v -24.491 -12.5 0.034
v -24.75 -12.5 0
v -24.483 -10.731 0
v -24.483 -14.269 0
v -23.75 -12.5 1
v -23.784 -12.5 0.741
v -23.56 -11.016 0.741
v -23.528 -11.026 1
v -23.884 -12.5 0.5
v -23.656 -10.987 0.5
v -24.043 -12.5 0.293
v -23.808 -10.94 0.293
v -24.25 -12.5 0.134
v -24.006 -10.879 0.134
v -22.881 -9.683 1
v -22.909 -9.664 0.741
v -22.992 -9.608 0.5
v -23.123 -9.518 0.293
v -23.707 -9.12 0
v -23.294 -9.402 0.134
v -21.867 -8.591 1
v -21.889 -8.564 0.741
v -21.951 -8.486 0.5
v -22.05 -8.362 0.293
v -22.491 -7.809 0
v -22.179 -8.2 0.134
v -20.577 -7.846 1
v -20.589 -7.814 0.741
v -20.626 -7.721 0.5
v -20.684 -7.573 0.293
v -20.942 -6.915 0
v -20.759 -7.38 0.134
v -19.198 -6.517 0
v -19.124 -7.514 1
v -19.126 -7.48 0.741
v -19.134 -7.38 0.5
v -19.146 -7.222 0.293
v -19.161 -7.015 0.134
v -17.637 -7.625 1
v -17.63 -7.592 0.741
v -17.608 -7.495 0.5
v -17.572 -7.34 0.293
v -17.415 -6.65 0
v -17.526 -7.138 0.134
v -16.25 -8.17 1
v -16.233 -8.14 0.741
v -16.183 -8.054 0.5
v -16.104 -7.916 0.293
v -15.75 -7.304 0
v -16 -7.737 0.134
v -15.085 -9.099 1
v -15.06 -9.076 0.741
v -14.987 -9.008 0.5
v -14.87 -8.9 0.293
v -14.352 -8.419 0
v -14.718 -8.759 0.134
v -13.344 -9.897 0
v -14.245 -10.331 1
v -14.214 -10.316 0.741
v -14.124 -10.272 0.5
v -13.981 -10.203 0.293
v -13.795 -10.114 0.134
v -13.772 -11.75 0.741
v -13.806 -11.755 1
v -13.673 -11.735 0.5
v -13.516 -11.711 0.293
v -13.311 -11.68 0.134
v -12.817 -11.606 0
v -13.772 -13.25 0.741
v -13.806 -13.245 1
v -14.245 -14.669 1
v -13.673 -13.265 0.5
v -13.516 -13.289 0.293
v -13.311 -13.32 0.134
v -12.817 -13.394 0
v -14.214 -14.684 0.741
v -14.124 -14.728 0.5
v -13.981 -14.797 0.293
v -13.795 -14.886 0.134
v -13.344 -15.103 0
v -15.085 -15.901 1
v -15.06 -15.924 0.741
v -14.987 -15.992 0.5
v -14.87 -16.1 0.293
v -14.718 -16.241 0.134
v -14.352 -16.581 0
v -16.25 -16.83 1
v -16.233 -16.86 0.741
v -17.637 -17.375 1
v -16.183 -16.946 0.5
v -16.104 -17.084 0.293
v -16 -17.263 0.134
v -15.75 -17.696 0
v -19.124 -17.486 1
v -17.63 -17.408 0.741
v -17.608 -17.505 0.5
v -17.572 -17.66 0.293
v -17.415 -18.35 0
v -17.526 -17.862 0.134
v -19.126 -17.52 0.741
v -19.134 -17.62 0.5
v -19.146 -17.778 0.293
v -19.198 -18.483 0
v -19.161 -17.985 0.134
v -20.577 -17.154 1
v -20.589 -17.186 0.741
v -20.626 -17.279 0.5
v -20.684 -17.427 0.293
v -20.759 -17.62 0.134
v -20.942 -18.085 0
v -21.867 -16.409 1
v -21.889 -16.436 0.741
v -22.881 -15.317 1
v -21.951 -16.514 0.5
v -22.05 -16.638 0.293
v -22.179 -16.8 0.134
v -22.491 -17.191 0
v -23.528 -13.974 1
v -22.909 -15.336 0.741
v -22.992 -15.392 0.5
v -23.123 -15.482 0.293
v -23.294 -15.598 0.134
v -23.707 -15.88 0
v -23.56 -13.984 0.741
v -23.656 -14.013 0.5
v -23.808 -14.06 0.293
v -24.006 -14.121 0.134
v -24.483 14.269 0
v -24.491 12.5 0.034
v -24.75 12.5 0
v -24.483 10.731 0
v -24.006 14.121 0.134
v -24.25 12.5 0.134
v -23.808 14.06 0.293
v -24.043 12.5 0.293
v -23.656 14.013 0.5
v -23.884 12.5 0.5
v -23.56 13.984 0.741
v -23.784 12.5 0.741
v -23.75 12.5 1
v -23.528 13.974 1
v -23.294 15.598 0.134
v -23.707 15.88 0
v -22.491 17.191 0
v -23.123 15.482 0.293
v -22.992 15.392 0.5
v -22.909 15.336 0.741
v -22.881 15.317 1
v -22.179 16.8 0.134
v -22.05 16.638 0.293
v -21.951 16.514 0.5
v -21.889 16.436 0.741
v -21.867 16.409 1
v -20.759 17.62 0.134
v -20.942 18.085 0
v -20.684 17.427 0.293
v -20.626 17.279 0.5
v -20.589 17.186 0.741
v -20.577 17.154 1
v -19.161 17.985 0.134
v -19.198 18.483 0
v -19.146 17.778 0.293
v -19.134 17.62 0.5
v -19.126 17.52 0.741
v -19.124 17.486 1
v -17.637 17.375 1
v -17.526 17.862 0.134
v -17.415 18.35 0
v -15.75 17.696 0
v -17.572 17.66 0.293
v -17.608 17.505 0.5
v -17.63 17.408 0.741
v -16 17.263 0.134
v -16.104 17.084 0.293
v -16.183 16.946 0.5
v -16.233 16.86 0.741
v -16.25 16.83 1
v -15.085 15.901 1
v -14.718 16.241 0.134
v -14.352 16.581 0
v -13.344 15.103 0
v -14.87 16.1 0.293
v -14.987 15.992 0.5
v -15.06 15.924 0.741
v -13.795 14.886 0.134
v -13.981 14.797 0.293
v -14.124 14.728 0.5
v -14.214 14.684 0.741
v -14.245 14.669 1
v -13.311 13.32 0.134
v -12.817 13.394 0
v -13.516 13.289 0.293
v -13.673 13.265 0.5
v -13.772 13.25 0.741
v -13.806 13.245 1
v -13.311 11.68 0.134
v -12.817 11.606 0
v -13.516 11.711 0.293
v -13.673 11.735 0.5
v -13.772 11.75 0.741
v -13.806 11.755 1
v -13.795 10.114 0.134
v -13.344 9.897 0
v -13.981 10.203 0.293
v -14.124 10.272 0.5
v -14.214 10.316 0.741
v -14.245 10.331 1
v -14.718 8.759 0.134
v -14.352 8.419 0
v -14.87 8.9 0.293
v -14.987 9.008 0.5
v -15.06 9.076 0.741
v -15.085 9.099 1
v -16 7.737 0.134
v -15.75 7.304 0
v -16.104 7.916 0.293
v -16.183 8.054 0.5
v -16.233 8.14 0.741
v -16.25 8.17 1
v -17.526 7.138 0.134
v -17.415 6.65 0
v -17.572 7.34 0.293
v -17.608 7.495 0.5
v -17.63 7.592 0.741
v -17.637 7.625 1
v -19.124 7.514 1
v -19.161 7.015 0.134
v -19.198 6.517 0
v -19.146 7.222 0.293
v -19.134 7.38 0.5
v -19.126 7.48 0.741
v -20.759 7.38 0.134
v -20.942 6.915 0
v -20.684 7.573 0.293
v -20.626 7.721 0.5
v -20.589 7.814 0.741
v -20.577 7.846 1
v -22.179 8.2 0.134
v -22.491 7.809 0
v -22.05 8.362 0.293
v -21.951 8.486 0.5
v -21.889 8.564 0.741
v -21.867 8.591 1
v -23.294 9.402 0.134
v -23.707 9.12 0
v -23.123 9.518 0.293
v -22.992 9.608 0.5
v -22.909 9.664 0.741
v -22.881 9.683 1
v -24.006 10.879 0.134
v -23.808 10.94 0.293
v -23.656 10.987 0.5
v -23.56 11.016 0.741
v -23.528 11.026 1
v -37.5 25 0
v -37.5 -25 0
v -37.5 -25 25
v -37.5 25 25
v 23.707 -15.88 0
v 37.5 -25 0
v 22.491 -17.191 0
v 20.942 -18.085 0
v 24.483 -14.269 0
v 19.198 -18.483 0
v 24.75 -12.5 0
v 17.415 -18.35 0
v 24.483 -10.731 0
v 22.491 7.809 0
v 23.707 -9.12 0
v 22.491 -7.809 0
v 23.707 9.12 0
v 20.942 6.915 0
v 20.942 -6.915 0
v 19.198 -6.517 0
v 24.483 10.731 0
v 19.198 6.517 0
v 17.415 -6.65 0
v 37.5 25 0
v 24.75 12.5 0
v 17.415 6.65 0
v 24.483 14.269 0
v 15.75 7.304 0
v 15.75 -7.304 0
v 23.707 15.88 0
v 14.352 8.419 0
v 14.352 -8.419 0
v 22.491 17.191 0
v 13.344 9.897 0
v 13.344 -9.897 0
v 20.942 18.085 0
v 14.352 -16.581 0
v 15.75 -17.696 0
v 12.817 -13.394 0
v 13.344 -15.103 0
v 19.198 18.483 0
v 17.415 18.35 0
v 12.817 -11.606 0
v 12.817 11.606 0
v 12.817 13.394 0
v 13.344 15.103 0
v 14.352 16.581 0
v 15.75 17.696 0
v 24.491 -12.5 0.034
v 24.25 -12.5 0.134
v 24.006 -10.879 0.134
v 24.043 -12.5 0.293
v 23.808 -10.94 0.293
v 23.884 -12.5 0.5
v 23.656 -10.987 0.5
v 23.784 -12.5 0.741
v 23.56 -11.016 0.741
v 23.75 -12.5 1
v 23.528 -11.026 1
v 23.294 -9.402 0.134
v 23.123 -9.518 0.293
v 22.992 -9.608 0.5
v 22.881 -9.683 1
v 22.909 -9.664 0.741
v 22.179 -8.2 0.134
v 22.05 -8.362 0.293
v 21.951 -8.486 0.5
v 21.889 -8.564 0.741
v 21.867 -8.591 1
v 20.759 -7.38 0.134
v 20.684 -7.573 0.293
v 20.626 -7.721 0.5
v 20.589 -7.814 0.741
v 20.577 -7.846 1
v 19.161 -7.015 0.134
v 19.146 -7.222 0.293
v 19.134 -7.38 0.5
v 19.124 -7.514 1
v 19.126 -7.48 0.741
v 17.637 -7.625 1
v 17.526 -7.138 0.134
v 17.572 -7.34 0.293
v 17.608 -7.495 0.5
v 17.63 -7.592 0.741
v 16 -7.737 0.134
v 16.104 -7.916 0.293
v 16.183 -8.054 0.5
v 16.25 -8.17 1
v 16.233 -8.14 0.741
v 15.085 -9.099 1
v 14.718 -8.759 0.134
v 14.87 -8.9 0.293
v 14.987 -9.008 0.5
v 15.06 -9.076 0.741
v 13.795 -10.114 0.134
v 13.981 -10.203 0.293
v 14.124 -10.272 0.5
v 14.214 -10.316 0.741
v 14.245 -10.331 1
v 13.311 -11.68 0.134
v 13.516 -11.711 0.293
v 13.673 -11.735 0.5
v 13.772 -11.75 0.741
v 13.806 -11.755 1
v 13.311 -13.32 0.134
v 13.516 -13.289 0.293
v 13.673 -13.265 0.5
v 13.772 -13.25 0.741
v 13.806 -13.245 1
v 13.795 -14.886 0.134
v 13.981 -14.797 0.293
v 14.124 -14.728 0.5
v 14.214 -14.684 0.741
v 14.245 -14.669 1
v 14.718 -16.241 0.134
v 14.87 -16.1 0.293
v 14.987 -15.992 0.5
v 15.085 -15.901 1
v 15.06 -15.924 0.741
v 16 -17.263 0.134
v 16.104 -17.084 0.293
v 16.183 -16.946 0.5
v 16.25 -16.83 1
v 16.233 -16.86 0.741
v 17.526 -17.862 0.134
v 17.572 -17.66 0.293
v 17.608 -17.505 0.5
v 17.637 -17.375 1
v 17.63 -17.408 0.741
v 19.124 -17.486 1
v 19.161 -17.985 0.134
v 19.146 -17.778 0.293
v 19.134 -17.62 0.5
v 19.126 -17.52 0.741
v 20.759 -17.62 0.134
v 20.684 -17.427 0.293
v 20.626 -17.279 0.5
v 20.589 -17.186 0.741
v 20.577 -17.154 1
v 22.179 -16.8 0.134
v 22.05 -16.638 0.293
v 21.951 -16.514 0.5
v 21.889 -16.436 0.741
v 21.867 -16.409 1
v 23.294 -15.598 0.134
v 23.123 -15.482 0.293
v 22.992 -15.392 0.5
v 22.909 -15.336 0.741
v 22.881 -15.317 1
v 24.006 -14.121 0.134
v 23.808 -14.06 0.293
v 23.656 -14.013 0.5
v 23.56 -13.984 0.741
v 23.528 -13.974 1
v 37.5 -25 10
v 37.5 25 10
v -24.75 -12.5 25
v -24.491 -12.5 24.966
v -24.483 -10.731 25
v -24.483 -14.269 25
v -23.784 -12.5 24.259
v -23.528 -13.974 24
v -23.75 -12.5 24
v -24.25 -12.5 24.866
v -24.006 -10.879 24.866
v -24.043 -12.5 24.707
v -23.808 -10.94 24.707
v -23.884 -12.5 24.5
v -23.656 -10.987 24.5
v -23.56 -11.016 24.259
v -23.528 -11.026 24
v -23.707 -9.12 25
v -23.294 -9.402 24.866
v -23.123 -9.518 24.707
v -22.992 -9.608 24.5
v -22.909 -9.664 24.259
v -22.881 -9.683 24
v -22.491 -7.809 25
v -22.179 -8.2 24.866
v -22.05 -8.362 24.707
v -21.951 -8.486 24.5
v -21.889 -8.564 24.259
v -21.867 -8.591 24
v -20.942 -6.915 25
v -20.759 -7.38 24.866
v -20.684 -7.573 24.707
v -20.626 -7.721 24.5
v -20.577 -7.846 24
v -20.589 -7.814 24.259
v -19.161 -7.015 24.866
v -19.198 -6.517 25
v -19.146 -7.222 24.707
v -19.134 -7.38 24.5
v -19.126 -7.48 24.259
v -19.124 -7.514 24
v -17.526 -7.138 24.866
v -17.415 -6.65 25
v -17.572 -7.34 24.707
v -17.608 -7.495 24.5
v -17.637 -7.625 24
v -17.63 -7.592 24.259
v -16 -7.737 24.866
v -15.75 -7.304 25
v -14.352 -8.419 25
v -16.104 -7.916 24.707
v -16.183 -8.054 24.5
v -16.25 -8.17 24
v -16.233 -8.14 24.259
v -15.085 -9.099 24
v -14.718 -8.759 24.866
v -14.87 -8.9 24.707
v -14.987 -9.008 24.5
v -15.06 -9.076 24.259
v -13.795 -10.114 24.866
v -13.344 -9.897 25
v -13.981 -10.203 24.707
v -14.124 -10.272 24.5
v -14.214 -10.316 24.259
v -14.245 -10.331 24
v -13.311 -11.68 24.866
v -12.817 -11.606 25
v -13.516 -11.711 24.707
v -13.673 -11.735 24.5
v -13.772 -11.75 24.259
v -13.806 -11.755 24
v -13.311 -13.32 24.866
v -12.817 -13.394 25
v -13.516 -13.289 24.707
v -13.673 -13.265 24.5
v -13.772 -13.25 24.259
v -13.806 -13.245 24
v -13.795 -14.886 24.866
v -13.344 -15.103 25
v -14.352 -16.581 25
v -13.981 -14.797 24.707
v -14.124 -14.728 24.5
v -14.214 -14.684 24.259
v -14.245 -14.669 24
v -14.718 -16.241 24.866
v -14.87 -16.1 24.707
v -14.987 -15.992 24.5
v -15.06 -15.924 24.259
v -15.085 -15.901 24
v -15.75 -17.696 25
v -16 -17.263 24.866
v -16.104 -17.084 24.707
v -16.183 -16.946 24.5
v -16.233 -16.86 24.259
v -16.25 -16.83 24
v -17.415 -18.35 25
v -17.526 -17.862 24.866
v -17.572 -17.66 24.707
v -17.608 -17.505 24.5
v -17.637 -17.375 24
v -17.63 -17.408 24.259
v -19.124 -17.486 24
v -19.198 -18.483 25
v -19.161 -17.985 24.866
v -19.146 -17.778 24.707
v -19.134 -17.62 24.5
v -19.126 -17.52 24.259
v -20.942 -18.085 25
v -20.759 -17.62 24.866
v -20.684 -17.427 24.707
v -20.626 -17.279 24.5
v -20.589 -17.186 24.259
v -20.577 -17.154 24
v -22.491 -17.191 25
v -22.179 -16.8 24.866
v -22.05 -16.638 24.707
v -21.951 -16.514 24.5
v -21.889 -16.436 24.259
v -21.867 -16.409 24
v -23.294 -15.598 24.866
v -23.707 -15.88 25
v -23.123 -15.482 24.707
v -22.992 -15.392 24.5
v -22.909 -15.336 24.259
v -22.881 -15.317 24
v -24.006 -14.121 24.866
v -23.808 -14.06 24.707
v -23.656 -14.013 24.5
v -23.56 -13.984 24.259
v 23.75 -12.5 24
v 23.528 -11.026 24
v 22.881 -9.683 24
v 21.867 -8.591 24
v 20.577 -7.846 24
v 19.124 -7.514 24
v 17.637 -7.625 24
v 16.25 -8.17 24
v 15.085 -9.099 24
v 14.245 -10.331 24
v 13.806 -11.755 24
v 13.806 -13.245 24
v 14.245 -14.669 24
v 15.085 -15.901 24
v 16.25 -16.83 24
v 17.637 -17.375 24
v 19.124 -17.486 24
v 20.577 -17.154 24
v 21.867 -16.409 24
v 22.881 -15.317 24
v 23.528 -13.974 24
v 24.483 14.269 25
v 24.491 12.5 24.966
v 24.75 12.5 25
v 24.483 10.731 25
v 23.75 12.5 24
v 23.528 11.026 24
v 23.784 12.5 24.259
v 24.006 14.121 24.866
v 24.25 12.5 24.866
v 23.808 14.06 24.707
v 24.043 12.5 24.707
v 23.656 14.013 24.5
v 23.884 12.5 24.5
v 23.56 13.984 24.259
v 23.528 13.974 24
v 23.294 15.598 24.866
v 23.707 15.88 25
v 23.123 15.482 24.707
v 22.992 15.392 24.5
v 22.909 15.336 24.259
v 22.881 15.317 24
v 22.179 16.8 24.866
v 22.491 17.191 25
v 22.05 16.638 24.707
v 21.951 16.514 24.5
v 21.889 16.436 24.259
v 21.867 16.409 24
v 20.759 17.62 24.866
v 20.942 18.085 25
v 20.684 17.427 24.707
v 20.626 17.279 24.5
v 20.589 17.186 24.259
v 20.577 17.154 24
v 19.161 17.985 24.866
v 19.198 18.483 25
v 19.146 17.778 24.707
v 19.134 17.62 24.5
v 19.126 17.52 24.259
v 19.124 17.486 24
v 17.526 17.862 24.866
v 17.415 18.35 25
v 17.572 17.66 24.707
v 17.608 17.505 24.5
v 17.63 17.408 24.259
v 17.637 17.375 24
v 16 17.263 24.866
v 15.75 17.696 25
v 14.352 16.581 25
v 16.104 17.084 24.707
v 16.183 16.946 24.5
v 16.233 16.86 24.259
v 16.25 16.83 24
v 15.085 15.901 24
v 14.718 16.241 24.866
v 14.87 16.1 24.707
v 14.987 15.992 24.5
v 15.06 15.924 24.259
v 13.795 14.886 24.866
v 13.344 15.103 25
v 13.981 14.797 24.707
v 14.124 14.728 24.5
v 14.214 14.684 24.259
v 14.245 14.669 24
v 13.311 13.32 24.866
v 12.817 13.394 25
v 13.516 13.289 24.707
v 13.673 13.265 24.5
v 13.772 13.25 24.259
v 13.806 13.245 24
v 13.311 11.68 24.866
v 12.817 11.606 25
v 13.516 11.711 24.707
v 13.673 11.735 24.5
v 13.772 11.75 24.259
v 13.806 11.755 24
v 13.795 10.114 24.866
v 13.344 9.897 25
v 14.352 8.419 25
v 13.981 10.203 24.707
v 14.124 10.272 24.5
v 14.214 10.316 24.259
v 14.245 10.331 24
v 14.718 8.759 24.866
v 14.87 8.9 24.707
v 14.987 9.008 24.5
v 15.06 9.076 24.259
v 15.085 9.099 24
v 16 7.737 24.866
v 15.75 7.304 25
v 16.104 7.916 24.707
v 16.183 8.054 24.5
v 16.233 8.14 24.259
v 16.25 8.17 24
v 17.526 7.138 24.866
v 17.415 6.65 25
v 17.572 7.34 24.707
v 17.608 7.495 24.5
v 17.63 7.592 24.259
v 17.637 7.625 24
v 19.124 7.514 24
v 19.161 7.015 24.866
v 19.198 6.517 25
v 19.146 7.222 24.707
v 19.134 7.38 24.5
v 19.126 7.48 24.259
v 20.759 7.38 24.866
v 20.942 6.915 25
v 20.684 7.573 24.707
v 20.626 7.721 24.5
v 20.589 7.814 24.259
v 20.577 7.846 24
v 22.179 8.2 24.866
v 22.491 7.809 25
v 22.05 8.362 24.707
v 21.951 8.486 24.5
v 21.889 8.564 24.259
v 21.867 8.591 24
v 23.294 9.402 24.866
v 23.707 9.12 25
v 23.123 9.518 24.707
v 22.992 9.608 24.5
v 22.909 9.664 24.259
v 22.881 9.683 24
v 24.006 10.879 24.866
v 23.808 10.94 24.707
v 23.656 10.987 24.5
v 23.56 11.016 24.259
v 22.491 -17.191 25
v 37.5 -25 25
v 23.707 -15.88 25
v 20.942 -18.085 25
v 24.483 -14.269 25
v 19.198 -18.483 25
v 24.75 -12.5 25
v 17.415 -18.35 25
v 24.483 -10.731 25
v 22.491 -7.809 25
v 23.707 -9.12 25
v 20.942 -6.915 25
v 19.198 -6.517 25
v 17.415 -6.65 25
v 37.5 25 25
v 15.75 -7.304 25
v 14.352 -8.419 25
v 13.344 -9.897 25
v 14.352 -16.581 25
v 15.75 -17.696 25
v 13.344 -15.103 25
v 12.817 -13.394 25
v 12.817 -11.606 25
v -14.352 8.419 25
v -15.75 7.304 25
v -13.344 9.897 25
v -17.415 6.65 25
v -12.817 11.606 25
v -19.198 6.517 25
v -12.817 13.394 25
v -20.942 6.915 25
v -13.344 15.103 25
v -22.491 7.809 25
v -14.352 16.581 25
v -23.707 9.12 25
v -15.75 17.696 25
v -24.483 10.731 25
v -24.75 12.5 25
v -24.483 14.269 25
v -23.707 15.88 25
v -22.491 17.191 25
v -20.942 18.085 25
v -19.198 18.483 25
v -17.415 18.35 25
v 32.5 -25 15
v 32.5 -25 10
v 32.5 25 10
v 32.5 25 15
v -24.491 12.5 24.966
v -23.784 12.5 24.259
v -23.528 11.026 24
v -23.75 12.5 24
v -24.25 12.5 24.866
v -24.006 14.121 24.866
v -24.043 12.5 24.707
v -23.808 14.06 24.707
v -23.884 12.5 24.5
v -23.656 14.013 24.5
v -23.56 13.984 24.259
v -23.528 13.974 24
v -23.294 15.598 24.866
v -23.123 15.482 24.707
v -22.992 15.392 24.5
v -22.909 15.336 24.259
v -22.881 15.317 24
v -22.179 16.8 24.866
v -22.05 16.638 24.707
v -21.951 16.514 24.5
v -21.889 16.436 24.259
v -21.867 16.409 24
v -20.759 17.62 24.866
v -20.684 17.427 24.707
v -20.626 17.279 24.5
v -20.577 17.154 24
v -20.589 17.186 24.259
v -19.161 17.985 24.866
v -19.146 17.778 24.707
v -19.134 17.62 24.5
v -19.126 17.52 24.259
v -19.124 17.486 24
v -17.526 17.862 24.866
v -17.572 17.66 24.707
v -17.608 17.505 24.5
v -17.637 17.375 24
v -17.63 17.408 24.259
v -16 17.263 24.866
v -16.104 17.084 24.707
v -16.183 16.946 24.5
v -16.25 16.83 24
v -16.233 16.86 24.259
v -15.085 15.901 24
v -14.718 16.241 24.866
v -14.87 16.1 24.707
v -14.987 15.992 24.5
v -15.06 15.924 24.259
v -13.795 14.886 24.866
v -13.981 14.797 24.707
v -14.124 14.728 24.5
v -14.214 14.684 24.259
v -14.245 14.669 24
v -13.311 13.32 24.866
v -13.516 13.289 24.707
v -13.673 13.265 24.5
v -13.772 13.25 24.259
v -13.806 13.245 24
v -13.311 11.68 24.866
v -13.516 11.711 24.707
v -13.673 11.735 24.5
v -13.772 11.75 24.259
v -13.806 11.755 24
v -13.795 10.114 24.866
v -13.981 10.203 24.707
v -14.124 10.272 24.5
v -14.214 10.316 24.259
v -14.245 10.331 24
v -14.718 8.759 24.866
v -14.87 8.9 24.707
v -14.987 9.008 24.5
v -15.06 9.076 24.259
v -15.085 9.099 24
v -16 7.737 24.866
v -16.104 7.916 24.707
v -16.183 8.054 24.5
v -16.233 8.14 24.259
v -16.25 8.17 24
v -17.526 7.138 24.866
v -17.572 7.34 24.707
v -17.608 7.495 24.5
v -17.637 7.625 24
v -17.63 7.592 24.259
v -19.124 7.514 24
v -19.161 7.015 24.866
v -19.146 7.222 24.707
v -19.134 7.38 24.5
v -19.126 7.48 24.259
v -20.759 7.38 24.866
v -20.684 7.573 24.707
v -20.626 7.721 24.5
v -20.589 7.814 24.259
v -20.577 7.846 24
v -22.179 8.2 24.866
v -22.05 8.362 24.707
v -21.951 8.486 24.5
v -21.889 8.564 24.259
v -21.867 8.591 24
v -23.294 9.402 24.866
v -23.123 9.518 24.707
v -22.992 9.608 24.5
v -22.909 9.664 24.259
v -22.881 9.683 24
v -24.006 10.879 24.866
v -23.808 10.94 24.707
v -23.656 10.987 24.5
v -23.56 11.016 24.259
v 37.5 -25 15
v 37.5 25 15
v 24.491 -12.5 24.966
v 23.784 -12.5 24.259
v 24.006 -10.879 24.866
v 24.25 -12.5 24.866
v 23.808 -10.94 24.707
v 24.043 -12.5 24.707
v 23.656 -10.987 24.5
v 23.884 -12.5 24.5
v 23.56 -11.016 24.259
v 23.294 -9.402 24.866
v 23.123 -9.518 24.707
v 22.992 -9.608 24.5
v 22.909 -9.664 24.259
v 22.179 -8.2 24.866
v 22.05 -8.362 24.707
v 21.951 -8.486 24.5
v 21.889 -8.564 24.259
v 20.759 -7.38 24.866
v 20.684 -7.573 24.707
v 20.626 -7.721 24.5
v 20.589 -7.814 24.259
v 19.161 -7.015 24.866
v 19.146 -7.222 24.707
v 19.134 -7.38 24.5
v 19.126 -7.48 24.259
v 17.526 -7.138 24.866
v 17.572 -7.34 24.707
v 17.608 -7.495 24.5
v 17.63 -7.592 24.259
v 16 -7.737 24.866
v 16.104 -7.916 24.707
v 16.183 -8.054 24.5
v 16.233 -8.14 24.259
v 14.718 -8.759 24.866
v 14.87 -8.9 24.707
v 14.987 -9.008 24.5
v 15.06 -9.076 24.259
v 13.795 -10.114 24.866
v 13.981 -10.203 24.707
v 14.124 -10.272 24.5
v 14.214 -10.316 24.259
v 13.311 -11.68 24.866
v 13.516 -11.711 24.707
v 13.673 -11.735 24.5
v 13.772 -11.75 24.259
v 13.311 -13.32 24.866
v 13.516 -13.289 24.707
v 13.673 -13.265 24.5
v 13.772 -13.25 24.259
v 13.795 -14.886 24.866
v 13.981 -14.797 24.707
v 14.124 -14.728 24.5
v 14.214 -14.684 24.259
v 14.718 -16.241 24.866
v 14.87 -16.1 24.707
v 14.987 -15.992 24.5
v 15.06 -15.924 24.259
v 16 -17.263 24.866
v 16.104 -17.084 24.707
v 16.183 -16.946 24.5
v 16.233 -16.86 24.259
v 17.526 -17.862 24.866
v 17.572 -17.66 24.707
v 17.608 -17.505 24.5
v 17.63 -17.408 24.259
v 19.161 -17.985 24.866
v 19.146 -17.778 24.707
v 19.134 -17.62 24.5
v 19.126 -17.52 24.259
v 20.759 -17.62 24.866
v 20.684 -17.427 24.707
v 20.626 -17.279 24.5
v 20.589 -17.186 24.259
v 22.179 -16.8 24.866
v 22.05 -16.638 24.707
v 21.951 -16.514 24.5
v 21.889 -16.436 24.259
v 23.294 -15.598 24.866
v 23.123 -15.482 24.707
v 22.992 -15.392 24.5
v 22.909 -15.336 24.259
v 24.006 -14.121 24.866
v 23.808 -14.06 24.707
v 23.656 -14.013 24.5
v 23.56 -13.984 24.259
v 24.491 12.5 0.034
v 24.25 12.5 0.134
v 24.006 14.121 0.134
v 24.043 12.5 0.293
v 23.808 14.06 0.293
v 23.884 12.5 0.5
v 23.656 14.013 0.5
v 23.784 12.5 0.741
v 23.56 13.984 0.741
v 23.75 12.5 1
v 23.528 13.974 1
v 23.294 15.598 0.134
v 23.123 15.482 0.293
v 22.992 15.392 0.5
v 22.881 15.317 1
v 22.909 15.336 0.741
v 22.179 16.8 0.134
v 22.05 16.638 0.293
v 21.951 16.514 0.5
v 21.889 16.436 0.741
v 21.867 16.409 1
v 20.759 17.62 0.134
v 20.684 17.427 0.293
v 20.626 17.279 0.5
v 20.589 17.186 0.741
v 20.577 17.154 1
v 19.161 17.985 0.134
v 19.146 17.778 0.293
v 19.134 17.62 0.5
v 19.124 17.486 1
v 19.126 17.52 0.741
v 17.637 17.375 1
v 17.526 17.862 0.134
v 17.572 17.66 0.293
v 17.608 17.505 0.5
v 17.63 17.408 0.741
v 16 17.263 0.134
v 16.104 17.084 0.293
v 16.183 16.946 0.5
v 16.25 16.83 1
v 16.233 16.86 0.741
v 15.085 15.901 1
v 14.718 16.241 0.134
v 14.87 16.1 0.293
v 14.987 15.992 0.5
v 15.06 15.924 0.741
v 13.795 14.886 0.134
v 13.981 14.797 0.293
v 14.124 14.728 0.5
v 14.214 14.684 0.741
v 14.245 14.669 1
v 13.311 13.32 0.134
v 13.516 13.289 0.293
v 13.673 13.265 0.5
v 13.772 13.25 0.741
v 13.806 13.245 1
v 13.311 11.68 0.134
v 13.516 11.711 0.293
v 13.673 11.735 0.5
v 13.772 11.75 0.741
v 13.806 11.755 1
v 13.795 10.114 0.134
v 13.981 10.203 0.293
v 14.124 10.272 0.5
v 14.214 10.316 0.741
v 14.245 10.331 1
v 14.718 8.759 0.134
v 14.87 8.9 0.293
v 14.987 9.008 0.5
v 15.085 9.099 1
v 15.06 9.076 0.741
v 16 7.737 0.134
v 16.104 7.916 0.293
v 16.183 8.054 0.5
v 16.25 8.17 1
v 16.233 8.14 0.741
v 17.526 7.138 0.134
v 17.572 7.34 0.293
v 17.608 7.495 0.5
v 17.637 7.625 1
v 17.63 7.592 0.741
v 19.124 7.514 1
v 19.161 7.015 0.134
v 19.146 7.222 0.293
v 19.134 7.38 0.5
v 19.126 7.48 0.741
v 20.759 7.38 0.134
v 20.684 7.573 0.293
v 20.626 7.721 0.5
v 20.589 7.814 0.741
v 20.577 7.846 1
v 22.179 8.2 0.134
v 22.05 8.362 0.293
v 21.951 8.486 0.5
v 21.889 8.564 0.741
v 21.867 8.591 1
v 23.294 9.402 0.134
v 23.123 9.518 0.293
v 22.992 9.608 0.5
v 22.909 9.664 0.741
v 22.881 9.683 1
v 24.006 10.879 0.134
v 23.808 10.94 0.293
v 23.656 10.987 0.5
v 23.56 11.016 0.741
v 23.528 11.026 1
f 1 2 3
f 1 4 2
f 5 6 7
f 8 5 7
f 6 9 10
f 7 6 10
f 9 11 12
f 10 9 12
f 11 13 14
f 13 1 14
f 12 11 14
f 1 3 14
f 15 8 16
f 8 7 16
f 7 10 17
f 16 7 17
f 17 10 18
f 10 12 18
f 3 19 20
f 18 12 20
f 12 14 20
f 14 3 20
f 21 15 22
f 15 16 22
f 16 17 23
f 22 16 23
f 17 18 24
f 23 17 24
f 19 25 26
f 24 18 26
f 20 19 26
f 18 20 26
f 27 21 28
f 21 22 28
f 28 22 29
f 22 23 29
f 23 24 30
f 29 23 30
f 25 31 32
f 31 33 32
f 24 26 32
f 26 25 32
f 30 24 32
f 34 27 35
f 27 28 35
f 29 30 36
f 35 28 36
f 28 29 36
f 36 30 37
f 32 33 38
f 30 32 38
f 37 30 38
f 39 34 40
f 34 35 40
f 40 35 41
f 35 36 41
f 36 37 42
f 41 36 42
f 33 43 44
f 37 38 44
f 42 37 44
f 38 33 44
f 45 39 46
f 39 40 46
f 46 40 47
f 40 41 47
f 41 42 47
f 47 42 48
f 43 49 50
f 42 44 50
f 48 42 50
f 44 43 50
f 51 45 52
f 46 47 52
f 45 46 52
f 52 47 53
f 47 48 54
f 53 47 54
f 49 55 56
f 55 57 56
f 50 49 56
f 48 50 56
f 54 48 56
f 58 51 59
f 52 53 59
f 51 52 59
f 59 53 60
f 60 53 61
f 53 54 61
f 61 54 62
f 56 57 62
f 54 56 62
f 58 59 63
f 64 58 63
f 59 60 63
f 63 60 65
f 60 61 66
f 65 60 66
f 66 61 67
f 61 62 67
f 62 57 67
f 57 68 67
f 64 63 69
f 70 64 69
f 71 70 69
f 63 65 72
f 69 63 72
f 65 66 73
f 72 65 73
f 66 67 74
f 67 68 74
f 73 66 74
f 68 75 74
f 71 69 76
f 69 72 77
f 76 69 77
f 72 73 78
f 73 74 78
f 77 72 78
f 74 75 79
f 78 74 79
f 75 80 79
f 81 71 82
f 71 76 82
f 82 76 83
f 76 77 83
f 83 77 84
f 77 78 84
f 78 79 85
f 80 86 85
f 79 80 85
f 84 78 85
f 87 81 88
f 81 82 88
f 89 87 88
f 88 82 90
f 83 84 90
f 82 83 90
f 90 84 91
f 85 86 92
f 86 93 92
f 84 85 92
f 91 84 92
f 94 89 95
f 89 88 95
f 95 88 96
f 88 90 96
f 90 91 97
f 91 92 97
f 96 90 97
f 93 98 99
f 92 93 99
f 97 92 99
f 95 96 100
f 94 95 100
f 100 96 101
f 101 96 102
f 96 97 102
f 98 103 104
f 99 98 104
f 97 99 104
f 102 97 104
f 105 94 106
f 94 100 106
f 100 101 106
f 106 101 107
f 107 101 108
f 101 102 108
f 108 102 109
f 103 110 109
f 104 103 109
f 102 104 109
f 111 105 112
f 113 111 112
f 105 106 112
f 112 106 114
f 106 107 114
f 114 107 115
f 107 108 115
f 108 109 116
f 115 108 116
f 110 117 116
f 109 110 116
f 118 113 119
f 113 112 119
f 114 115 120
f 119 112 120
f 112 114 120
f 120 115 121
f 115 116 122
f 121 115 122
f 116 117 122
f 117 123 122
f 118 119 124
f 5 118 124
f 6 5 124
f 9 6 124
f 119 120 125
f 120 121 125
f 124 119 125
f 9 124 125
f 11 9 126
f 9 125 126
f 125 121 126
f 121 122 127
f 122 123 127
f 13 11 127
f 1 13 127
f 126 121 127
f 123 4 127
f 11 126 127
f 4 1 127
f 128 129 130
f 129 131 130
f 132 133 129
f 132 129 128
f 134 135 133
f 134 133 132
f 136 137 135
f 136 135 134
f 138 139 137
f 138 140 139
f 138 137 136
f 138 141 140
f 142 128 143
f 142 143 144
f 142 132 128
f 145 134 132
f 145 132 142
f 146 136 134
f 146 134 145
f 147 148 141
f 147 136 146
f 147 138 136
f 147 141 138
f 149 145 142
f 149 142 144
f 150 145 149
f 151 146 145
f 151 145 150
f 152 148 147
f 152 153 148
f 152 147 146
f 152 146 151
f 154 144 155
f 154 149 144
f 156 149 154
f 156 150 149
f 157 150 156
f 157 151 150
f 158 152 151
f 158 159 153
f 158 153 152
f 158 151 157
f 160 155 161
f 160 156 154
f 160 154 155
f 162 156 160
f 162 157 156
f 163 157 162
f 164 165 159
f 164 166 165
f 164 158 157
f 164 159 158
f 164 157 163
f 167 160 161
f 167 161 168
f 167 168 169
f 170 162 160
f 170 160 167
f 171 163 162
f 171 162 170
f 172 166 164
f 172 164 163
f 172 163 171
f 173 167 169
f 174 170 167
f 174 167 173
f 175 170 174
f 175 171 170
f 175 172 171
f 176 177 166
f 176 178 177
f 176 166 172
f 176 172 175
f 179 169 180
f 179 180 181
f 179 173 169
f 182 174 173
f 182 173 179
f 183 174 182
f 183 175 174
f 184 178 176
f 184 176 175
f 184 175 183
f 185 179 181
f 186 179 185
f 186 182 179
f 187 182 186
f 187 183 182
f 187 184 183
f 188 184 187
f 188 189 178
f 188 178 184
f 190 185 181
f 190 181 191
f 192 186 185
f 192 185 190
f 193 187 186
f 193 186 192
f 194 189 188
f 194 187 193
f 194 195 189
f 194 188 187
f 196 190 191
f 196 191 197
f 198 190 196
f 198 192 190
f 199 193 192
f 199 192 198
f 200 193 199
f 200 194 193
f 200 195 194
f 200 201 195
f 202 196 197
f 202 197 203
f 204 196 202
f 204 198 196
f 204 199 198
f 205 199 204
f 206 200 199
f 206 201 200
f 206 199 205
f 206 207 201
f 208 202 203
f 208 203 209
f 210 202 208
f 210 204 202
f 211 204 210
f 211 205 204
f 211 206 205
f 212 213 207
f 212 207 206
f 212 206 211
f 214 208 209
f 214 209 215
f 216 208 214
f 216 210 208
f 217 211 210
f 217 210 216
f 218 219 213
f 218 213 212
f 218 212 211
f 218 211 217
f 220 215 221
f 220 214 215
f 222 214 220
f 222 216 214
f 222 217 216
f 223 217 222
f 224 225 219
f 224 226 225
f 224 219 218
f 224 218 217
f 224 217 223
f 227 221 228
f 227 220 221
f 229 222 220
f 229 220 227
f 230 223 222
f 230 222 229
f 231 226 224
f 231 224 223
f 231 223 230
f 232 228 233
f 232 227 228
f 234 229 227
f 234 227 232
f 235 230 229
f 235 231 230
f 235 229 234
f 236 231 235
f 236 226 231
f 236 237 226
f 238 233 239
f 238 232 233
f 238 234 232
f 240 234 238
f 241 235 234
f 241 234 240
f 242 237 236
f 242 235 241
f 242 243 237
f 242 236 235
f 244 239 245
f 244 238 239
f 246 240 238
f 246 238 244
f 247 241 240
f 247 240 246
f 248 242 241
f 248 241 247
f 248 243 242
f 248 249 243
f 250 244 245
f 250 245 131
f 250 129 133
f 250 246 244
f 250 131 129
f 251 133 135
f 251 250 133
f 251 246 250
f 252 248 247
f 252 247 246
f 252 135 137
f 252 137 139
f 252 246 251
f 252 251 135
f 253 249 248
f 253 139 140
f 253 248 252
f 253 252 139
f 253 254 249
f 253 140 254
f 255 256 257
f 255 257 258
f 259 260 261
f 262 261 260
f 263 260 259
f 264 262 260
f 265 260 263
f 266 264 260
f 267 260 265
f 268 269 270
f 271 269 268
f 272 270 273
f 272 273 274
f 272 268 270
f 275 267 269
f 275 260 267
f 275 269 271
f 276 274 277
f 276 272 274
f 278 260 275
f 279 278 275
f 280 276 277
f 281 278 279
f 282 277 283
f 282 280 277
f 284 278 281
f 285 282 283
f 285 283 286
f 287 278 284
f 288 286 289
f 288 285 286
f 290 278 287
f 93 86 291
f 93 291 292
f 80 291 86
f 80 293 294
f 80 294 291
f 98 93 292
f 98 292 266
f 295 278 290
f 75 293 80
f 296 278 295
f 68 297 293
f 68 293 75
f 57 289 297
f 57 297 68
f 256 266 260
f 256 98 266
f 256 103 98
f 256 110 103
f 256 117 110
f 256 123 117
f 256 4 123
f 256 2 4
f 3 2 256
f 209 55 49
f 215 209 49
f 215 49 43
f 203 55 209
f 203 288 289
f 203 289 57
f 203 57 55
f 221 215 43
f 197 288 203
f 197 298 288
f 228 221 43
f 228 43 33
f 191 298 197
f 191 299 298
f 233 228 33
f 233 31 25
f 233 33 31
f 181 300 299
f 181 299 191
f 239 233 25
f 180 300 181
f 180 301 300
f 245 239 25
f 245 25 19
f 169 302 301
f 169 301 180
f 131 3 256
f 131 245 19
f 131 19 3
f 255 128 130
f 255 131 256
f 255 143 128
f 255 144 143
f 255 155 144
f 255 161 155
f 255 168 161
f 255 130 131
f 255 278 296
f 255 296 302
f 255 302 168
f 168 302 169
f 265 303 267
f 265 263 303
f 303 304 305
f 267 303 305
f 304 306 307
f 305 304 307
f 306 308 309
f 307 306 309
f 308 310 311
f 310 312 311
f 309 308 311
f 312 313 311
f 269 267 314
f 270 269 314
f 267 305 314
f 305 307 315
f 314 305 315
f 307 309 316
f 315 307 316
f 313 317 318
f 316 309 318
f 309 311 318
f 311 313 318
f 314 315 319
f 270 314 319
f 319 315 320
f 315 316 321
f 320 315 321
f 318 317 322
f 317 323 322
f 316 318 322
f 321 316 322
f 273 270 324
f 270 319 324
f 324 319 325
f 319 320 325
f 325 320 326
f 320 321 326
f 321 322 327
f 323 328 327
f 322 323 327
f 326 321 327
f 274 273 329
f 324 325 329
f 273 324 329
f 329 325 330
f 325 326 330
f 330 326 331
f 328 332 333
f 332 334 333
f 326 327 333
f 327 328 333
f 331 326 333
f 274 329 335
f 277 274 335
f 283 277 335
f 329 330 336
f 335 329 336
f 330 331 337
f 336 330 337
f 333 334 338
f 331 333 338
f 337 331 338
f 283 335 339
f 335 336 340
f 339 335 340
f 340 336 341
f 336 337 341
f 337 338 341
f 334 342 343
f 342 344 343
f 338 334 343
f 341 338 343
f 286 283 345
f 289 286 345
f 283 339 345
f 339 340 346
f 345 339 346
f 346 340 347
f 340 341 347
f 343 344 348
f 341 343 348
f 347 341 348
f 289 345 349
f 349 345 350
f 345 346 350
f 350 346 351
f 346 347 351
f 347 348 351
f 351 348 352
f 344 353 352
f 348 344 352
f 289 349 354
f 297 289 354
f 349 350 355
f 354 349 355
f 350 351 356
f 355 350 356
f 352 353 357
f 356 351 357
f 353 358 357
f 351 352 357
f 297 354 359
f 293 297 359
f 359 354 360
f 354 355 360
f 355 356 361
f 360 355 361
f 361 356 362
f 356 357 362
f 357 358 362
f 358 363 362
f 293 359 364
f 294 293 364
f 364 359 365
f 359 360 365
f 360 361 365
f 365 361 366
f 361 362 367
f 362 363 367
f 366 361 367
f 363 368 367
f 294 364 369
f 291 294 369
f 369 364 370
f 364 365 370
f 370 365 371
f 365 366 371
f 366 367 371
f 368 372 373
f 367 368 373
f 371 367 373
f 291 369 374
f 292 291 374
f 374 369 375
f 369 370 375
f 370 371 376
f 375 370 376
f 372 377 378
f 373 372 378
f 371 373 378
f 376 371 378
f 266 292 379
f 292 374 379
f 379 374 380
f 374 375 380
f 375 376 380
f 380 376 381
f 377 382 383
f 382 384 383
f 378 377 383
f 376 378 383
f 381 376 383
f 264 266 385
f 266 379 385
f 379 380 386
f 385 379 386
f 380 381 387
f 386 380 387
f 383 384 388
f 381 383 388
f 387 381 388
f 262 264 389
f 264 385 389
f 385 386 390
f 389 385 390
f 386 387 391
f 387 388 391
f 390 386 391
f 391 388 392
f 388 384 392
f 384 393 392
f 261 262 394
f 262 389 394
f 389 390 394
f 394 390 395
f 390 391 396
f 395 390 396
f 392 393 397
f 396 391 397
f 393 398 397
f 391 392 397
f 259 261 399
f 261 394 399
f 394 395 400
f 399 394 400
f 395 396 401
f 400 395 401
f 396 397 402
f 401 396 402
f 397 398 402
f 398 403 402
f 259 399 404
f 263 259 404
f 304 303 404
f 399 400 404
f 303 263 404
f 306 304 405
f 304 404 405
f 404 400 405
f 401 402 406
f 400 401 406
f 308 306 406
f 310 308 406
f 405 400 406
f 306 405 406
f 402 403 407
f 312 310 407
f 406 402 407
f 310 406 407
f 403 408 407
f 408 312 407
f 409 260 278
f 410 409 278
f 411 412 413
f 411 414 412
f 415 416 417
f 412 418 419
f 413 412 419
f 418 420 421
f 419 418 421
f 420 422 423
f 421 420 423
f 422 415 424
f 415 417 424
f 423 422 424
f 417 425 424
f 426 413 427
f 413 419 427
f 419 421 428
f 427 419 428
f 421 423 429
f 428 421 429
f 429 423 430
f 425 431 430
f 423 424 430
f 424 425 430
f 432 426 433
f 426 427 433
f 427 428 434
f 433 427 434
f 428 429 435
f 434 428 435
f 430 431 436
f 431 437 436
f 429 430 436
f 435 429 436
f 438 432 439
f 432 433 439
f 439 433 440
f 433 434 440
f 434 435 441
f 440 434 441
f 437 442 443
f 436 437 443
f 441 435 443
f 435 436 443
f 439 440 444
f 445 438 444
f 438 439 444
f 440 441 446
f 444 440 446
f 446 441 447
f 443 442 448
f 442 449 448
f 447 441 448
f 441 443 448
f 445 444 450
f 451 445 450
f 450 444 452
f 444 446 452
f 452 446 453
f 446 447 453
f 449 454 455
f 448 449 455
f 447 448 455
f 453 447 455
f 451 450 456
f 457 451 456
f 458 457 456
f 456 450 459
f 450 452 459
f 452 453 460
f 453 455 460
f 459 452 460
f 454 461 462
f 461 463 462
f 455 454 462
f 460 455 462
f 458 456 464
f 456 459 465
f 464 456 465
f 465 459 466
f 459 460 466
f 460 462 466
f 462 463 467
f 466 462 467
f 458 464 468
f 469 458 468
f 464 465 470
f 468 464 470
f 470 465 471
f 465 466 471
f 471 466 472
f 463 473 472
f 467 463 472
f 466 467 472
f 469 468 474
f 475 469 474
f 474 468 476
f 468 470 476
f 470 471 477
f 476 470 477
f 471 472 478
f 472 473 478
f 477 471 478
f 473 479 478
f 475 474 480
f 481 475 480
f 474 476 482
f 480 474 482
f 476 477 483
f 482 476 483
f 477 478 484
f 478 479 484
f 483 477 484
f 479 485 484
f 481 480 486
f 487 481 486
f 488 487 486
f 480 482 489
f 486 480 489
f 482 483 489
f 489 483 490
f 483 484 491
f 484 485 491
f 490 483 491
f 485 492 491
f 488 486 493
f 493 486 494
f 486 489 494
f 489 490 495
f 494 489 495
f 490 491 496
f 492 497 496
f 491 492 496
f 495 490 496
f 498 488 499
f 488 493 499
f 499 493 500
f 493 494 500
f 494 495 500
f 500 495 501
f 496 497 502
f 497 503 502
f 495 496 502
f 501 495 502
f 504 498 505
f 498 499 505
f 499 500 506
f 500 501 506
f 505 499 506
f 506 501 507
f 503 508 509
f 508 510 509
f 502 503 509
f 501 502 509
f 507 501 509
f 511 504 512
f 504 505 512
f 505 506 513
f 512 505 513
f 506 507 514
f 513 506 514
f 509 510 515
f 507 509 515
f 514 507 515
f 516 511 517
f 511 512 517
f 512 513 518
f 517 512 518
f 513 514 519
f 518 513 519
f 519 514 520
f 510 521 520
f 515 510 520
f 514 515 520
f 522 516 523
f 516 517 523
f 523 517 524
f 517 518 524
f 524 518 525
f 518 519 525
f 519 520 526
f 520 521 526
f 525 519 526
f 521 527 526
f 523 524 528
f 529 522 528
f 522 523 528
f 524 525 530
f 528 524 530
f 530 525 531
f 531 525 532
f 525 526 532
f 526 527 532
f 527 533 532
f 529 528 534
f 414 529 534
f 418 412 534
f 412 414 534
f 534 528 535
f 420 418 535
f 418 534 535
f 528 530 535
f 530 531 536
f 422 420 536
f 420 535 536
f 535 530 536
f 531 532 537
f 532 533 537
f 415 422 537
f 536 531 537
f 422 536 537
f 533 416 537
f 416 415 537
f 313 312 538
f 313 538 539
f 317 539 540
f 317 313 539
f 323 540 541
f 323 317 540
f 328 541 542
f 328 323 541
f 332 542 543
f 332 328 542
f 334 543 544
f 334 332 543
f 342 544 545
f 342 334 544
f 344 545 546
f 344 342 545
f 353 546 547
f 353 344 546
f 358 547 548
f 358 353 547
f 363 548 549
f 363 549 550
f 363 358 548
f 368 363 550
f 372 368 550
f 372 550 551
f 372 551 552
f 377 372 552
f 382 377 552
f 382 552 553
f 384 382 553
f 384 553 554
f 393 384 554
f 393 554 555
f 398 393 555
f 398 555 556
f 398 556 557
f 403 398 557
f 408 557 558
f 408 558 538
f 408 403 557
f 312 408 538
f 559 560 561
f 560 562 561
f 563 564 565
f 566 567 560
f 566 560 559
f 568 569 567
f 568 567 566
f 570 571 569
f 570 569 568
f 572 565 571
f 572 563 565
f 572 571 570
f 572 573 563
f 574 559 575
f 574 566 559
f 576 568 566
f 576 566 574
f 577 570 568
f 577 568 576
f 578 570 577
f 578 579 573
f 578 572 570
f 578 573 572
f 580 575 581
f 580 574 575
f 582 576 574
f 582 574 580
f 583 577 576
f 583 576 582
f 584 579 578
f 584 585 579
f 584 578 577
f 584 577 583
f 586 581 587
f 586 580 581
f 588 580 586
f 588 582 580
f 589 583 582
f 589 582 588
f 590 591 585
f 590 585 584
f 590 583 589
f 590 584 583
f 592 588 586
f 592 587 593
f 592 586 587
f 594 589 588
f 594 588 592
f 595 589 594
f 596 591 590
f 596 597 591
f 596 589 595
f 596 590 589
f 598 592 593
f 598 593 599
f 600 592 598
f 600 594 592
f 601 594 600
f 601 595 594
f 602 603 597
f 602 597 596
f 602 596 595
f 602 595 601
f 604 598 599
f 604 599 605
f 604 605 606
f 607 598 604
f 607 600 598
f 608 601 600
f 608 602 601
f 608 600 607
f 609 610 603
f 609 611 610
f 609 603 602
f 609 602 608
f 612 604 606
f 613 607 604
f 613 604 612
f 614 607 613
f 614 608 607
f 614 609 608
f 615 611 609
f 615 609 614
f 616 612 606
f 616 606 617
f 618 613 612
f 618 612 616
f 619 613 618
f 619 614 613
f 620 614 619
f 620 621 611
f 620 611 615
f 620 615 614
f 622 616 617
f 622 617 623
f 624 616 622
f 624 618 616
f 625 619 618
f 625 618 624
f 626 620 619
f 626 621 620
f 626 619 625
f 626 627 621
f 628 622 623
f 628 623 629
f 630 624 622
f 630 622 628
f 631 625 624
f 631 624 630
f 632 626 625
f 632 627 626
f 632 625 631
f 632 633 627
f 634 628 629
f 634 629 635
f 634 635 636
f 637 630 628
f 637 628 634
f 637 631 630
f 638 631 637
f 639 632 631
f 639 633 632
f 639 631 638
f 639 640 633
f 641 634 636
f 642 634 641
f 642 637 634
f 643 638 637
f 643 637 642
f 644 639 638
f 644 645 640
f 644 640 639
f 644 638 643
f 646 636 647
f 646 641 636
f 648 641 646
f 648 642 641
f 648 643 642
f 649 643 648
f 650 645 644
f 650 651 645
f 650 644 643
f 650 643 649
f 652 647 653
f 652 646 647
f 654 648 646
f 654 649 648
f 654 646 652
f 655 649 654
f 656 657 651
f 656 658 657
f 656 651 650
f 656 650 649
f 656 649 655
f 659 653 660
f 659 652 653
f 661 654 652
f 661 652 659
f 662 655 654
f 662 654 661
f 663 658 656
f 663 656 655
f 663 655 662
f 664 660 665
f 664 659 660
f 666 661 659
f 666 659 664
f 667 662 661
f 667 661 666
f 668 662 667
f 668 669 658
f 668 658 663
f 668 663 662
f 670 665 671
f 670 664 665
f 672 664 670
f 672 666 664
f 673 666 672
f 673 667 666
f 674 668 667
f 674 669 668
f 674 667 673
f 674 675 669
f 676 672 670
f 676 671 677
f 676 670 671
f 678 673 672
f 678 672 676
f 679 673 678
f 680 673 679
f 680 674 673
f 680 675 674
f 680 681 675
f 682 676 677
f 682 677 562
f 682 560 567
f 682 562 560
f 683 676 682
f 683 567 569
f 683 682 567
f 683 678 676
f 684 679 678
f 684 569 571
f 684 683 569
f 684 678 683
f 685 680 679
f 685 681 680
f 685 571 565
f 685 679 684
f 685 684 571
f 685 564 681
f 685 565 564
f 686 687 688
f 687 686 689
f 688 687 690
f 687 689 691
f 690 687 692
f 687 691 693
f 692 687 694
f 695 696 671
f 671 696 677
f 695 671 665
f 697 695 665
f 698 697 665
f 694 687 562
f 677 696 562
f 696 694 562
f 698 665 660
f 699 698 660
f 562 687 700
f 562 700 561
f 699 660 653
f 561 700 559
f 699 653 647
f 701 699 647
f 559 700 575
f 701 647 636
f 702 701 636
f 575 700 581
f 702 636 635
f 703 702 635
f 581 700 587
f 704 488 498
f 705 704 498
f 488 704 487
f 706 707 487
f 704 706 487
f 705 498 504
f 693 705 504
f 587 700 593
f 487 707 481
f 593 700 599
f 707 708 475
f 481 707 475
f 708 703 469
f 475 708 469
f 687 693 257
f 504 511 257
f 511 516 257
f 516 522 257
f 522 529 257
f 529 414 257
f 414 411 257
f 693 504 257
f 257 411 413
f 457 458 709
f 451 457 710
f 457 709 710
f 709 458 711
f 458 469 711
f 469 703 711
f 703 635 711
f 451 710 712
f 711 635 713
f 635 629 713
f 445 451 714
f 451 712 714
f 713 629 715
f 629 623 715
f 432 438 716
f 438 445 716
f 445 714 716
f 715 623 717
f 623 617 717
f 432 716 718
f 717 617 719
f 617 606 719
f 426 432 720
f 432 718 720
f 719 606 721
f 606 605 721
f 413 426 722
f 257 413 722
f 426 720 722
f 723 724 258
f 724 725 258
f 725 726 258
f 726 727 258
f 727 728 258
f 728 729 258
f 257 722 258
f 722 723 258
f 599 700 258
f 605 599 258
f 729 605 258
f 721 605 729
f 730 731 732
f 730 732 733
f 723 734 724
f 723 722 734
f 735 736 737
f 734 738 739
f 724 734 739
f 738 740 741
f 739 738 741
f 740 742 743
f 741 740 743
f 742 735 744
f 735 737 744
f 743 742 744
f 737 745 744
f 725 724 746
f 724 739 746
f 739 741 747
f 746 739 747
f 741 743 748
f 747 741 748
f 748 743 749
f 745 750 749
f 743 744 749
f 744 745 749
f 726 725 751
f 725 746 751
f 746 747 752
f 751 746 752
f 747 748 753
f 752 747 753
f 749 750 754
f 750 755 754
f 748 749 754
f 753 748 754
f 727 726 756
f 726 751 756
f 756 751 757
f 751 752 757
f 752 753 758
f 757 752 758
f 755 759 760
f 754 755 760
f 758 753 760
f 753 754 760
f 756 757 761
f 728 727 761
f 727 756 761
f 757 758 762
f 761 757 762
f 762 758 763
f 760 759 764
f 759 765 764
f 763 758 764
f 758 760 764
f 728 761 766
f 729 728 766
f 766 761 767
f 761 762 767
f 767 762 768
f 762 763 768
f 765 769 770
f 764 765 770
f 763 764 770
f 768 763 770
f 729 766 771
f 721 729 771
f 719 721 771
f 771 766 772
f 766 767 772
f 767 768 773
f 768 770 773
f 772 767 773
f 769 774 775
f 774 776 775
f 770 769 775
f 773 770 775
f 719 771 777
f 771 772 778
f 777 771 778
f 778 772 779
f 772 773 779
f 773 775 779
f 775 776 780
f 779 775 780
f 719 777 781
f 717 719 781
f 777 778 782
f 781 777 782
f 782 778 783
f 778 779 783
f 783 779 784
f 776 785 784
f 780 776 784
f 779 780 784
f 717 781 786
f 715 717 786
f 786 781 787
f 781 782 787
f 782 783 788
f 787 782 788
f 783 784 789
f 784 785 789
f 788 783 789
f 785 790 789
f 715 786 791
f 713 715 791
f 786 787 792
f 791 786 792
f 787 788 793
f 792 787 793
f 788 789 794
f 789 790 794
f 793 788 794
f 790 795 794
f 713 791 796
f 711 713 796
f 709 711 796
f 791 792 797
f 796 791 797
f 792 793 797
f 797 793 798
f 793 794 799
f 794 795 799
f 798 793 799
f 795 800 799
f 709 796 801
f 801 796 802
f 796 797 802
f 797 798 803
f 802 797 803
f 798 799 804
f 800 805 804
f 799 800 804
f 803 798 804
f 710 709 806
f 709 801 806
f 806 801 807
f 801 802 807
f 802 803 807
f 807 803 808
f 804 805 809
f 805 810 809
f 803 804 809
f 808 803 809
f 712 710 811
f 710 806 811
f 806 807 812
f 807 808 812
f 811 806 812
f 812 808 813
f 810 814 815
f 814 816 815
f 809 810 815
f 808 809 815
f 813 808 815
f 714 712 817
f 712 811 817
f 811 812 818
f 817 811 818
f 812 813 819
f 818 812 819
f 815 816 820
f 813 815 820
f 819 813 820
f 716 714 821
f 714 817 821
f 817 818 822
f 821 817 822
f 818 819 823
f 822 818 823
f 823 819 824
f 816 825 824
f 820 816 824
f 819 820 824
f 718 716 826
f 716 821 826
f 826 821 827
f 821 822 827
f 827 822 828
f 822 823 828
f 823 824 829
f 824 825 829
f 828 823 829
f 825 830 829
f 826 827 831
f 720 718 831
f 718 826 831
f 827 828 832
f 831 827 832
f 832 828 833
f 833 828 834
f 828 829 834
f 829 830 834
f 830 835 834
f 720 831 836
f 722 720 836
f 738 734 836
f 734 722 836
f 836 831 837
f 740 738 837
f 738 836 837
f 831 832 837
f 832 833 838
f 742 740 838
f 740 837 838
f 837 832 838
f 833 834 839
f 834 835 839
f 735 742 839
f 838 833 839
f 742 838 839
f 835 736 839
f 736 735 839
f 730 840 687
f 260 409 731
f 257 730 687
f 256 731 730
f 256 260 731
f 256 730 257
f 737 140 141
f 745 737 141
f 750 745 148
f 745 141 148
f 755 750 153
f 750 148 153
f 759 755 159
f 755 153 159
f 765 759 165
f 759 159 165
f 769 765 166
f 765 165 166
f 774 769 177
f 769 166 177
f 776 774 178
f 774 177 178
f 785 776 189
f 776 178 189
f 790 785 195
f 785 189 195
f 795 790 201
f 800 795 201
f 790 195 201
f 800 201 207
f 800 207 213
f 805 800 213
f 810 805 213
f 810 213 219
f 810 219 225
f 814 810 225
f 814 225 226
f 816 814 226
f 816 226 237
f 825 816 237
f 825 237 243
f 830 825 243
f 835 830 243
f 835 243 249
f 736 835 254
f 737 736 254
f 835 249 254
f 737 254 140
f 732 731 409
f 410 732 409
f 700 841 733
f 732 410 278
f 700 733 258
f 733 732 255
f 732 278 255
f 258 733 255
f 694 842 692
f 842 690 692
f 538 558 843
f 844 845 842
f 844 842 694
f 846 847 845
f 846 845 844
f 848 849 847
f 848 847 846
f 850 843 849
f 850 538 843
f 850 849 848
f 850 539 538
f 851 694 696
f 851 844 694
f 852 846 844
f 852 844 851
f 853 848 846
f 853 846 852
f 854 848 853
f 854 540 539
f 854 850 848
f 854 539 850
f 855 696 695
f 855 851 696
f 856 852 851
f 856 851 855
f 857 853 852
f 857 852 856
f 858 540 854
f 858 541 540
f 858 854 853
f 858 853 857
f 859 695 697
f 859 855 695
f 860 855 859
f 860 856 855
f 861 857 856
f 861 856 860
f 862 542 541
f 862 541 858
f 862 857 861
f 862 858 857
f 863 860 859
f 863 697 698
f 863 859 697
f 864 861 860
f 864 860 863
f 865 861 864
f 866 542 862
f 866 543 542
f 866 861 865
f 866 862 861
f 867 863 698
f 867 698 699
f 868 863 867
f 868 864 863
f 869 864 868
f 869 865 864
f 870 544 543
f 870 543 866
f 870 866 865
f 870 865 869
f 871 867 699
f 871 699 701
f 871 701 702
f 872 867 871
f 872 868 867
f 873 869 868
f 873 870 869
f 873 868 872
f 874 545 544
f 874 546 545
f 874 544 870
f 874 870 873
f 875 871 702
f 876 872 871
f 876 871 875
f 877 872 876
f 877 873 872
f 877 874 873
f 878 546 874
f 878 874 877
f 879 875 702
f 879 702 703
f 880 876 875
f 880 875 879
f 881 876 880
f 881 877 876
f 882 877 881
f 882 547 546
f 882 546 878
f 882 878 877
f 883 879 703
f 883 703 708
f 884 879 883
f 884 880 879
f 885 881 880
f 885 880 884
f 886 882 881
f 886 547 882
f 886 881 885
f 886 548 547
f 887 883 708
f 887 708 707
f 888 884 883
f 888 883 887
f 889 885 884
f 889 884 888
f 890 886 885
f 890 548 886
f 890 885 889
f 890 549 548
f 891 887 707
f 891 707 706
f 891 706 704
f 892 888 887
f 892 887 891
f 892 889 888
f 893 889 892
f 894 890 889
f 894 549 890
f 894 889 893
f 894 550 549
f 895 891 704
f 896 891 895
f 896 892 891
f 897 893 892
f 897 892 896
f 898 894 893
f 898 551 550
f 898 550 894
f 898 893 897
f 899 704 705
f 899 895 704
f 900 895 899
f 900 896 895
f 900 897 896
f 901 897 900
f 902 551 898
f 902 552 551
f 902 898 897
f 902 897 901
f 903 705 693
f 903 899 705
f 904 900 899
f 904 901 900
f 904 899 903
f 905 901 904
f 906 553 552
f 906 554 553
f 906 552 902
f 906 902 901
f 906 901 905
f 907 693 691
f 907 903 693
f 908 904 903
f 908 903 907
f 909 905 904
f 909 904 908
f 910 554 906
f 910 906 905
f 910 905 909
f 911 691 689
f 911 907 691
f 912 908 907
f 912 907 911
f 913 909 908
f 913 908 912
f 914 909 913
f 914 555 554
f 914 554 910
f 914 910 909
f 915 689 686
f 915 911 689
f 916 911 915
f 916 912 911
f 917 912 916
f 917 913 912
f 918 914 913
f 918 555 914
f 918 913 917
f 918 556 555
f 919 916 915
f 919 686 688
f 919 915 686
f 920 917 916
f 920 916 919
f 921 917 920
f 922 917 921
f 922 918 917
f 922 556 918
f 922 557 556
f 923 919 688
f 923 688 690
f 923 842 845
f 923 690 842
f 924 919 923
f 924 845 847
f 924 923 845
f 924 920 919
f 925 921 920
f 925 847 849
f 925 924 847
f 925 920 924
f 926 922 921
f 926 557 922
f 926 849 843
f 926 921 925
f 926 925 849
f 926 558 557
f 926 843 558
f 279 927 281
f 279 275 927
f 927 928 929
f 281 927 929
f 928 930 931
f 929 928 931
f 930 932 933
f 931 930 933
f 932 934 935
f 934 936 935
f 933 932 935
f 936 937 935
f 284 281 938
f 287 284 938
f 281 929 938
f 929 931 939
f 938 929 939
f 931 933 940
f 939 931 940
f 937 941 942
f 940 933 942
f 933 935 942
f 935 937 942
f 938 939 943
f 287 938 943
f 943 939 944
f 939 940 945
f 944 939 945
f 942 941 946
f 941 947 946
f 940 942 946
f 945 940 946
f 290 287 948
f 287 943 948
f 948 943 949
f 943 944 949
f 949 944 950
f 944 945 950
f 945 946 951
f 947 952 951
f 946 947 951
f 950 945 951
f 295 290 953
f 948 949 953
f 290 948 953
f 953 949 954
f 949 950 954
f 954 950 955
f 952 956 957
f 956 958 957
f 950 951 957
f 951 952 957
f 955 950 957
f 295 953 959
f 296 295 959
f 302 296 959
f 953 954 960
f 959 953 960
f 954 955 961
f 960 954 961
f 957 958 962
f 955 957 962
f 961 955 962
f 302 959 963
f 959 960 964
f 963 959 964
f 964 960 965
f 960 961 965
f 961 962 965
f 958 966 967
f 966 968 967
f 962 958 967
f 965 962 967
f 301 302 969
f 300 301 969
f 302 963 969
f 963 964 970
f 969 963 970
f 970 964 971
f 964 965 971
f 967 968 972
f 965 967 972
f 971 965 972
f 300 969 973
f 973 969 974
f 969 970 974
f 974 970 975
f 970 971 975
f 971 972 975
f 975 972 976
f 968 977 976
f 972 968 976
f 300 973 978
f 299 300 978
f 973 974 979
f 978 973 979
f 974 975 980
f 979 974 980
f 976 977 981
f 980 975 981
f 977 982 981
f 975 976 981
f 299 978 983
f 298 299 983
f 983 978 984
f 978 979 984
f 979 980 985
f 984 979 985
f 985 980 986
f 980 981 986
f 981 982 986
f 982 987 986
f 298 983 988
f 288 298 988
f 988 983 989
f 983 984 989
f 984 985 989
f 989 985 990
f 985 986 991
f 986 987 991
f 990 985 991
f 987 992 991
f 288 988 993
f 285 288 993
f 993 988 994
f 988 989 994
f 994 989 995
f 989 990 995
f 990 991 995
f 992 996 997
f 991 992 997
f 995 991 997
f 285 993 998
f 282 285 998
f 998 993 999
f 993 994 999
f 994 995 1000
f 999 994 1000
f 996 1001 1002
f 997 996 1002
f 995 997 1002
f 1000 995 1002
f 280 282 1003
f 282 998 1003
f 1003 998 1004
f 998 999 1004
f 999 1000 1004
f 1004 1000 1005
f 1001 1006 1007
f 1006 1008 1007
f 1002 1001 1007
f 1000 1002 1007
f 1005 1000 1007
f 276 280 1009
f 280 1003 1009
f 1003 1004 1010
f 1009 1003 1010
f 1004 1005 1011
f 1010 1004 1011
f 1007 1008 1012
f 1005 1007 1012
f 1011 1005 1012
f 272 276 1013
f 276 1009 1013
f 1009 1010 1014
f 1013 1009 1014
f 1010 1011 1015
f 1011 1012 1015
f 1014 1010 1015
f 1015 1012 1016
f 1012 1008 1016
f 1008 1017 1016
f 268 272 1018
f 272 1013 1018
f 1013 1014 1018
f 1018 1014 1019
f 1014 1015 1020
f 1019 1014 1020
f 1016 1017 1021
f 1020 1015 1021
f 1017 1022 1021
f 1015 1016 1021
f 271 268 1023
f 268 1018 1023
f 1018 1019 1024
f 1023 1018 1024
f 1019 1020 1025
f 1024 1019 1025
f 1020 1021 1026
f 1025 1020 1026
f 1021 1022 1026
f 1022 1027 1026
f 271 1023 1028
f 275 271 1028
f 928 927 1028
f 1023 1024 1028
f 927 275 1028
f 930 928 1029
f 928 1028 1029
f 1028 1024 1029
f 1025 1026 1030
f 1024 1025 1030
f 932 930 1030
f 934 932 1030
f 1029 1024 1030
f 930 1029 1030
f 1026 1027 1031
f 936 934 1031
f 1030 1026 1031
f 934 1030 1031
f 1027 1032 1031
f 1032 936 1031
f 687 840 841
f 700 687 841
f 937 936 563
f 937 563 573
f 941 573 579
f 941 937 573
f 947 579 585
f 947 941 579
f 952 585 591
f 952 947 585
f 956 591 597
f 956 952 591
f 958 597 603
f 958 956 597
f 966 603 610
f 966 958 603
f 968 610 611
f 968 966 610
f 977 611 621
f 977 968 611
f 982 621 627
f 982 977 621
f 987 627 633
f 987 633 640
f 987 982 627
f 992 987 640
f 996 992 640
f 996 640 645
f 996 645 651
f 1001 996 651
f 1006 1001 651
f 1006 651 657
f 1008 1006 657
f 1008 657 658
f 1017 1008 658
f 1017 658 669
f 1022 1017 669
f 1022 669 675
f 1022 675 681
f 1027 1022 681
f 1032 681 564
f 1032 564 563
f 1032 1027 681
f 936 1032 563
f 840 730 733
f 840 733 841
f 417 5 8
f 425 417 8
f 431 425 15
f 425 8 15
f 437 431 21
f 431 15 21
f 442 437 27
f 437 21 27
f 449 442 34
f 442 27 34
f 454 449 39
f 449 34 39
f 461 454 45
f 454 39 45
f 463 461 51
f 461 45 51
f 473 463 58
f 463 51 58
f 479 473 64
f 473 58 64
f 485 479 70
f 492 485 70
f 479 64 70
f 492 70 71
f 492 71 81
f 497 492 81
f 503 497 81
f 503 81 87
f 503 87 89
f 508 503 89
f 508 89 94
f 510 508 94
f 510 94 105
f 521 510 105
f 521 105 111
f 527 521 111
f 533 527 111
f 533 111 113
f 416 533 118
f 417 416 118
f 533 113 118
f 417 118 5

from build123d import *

# Parameters (mm, degrees)
SKETCH_W     = 37.5
SKETCH_H     = 50
SKETCH_R     = 5
PAD_DEPTH    = 25
SKETCH001_W  = 5
SKETCH001_H  = 5
POCKET_DEPTH = 50.001
FILLET_R     = 1
FILLET001_R  = 1


with BuildPart() as part:
    # Sketch → Pad (new body)
    with BuildSketch(Plane.XY):
        with Locations((18.75, 0)):
            Rectangle(SKETCH_W, SKETCH_H)
        with Locations((18.75, 12.5)):
            Circle(SKETCH_R, mode=Mode.SUBTRACT)
        with Locations((18.75, -12.5)):
            Circle(SKETCH_R, mode=Mode.SUBTRACT)
    pad = extrude(amount=PAD_DEPTH)

    # Mirrored: Pad across Sketch V_Axis
    add(pad.mirror(Plane(origin=(0, 0, 0), x_dir=(0, 0, 1), z_dir=(1, 0, 0))))

    # Sketch001 (on Face3 of Mirrored) → Pocket (cut, through all)
    with BuildSketch(Plane.XZ.offset(25)):
        with Locations((35, 12.5)):
            Rectangle(SKETCH001_W, SKETCH001_H)
    extrude(amount=-POCKET_DEPTH, mode=Mode.SUBTRACT)

    # Fillet
    fillet_edges = [part.edges().sort_by_distance(p)[0] for p in [
        (-13.75, -12.5, 25),
        (-13.75, 12.5, 25),
        (13.75, 12.5, 25),
        (13.75, -12.5, 25),
    ]]
    fillet(fillet_edges, radius=FILLET_R)

    # Fillet001
    fillet001_edges = [part.edges().sort_by_distance(p)[0] for p in [
        (13.75, -12.5, 0),
        (13.75, 12.5, 0),
        (-13.75, 12.5, 0),
        (-13.75, -12.5, 0),
    ]]
    fillet(fillet001_edges, radius=FILLET001_R)


solid = part.part
